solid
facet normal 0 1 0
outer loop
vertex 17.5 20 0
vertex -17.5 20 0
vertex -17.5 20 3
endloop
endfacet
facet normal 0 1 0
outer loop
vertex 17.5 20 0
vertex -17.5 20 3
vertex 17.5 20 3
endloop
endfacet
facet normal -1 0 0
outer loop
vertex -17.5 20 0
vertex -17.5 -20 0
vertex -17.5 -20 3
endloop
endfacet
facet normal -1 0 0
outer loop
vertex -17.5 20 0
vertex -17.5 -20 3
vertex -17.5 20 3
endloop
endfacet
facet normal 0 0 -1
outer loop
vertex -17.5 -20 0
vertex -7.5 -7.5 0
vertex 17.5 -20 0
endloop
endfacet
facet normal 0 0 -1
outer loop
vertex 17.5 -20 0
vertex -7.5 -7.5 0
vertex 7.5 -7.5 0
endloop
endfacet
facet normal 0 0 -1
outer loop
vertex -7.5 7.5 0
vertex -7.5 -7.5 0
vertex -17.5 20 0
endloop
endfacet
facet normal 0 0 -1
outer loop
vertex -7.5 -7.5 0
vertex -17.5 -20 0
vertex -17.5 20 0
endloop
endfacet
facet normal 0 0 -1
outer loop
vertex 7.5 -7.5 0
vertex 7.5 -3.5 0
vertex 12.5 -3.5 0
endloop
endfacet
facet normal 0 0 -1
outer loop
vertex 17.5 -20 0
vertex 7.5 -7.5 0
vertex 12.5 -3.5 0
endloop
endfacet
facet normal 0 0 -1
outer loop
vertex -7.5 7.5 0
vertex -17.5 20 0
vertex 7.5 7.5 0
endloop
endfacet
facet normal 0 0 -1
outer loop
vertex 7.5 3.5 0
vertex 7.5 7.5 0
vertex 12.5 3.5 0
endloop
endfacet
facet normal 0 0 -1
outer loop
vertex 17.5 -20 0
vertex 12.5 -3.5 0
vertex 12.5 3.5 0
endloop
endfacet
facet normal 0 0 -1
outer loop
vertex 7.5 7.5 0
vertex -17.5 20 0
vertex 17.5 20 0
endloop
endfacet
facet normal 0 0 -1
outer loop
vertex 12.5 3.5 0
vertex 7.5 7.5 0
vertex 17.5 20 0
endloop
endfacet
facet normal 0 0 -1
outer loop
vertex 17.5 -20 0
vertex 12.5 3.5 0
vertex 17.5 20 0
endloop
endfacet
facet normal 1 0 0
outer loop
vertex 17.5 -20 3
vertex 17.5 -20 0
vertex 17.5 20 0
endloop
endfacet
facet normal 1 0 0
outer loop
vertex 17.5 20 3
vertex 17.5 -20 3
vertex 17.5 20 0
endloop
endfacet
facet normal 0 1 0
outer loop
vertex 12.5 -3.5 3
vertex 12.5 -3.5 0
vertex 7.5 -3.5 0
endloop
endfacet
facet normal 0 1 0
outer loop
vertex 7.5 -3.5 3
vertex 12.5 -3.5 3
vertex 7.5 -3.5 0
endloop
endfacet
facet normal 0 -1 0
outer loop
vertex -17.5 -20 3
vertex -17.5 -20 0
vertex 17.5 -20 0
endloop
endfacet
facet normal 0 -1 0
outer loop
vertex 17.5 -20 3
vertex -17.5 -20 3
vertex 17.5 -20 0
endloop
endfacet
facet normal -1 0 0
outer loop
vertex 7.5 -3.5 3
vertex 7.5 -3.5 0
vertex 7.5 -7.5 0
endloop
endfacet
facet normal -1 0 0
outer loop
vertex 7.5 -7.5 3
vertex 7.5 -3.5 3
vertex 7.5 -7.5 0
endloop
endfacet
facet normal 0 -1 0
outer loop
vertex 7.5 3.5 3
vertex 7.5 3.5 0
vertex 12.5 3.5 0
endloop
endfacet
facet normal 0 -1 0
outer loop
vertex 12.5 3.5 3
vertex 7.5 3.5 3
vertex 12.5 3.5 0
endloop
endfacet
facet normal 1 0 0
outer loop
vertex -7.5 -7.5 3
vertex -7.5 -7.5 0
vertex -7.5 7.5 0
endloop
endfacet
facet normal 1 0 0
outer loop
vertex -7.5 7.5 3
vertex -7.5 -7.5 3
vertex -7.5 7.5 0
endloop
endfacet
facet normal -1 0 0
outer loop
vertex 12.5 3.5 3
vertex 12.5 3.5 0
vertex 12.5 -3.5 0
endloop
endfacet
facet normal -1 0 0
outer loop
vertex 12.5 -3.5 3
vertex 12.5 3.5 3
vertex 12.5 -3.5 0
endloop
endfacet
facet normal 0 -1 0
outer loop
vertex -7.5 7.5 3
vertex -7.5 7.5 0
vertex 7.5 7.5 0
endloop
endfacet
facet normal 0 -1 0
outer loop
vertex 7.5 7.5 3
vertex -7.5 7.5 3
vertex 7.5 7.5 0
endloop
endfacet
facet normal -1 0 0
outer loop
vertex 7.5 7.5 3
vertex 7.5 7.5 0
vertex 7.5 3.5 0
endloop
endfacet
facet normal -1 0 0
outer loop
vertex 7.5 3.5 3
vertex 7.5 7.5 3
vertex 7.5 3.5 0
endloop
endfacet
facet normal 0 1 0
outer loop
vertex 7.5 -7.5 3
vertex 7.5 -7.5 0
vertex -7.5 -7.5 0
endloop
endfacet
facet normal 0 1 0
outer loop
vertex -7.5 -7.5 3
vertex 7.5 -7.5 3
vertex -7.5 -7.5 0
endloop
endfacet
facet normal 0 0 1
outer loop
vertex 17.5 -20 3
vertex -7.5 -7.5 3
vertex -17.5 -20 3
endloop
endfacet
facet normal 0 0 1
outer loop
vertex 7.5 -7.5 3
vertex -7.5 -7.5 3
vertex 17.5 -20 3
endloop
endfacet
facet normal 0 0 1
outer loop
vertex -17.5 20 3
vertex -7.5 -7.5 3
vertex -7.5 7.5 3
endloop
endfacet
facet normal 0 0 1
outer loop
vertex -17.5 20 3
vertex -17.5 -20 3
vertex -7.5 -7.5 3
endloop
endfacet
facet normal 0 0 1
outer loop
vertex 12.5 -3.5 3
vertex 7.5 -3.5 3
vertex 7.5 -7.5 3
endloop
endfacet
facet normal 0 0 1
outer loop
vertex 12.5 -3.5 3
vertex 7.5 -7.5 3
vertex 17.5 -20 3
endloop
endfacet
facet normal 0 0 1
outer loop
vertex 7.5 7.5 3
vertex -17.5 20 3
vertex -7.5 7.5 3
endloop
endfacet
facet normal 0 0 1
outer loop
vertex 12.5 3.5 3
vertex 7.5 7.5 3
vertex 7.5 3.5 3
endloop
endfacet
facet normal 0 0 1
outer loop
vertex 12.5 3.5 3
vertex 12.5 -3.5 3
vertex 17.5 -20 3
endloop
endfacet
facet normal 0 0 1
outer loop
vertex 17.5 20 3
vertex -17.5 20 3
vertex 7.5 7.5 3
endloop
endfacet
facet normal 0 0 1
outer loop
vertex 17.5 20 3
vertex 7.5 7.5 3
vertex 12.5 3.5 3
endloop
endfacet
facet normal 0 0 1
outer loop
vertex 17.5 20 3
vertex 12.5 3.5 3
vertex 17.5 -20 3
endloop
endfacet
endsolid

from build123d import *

# Parameters (mm, degrees)
SKETCH_W      = 35
SKETCH_H      = 40
EXTRUDE_DEPTH = 3


with BuildPart() as part:
    # Sketch → Extrude (new body)
    with BuildSketch(Plane.XY):
        Rectangle(SKETCH_W, SKETCH_H)
        Polygon((-7.5, -7.5), (-7.5, 7.5), (7.5, 7.5), (7.5, 3.5), (12.5, 3.5), (12.5, -3.5), (7.5, -3.5), (7.5, -7.5), align=None, mode=Mode.SUBTRACT)
    extrude(amount=EXTRUDE_DEPTH)


solid = part.part
